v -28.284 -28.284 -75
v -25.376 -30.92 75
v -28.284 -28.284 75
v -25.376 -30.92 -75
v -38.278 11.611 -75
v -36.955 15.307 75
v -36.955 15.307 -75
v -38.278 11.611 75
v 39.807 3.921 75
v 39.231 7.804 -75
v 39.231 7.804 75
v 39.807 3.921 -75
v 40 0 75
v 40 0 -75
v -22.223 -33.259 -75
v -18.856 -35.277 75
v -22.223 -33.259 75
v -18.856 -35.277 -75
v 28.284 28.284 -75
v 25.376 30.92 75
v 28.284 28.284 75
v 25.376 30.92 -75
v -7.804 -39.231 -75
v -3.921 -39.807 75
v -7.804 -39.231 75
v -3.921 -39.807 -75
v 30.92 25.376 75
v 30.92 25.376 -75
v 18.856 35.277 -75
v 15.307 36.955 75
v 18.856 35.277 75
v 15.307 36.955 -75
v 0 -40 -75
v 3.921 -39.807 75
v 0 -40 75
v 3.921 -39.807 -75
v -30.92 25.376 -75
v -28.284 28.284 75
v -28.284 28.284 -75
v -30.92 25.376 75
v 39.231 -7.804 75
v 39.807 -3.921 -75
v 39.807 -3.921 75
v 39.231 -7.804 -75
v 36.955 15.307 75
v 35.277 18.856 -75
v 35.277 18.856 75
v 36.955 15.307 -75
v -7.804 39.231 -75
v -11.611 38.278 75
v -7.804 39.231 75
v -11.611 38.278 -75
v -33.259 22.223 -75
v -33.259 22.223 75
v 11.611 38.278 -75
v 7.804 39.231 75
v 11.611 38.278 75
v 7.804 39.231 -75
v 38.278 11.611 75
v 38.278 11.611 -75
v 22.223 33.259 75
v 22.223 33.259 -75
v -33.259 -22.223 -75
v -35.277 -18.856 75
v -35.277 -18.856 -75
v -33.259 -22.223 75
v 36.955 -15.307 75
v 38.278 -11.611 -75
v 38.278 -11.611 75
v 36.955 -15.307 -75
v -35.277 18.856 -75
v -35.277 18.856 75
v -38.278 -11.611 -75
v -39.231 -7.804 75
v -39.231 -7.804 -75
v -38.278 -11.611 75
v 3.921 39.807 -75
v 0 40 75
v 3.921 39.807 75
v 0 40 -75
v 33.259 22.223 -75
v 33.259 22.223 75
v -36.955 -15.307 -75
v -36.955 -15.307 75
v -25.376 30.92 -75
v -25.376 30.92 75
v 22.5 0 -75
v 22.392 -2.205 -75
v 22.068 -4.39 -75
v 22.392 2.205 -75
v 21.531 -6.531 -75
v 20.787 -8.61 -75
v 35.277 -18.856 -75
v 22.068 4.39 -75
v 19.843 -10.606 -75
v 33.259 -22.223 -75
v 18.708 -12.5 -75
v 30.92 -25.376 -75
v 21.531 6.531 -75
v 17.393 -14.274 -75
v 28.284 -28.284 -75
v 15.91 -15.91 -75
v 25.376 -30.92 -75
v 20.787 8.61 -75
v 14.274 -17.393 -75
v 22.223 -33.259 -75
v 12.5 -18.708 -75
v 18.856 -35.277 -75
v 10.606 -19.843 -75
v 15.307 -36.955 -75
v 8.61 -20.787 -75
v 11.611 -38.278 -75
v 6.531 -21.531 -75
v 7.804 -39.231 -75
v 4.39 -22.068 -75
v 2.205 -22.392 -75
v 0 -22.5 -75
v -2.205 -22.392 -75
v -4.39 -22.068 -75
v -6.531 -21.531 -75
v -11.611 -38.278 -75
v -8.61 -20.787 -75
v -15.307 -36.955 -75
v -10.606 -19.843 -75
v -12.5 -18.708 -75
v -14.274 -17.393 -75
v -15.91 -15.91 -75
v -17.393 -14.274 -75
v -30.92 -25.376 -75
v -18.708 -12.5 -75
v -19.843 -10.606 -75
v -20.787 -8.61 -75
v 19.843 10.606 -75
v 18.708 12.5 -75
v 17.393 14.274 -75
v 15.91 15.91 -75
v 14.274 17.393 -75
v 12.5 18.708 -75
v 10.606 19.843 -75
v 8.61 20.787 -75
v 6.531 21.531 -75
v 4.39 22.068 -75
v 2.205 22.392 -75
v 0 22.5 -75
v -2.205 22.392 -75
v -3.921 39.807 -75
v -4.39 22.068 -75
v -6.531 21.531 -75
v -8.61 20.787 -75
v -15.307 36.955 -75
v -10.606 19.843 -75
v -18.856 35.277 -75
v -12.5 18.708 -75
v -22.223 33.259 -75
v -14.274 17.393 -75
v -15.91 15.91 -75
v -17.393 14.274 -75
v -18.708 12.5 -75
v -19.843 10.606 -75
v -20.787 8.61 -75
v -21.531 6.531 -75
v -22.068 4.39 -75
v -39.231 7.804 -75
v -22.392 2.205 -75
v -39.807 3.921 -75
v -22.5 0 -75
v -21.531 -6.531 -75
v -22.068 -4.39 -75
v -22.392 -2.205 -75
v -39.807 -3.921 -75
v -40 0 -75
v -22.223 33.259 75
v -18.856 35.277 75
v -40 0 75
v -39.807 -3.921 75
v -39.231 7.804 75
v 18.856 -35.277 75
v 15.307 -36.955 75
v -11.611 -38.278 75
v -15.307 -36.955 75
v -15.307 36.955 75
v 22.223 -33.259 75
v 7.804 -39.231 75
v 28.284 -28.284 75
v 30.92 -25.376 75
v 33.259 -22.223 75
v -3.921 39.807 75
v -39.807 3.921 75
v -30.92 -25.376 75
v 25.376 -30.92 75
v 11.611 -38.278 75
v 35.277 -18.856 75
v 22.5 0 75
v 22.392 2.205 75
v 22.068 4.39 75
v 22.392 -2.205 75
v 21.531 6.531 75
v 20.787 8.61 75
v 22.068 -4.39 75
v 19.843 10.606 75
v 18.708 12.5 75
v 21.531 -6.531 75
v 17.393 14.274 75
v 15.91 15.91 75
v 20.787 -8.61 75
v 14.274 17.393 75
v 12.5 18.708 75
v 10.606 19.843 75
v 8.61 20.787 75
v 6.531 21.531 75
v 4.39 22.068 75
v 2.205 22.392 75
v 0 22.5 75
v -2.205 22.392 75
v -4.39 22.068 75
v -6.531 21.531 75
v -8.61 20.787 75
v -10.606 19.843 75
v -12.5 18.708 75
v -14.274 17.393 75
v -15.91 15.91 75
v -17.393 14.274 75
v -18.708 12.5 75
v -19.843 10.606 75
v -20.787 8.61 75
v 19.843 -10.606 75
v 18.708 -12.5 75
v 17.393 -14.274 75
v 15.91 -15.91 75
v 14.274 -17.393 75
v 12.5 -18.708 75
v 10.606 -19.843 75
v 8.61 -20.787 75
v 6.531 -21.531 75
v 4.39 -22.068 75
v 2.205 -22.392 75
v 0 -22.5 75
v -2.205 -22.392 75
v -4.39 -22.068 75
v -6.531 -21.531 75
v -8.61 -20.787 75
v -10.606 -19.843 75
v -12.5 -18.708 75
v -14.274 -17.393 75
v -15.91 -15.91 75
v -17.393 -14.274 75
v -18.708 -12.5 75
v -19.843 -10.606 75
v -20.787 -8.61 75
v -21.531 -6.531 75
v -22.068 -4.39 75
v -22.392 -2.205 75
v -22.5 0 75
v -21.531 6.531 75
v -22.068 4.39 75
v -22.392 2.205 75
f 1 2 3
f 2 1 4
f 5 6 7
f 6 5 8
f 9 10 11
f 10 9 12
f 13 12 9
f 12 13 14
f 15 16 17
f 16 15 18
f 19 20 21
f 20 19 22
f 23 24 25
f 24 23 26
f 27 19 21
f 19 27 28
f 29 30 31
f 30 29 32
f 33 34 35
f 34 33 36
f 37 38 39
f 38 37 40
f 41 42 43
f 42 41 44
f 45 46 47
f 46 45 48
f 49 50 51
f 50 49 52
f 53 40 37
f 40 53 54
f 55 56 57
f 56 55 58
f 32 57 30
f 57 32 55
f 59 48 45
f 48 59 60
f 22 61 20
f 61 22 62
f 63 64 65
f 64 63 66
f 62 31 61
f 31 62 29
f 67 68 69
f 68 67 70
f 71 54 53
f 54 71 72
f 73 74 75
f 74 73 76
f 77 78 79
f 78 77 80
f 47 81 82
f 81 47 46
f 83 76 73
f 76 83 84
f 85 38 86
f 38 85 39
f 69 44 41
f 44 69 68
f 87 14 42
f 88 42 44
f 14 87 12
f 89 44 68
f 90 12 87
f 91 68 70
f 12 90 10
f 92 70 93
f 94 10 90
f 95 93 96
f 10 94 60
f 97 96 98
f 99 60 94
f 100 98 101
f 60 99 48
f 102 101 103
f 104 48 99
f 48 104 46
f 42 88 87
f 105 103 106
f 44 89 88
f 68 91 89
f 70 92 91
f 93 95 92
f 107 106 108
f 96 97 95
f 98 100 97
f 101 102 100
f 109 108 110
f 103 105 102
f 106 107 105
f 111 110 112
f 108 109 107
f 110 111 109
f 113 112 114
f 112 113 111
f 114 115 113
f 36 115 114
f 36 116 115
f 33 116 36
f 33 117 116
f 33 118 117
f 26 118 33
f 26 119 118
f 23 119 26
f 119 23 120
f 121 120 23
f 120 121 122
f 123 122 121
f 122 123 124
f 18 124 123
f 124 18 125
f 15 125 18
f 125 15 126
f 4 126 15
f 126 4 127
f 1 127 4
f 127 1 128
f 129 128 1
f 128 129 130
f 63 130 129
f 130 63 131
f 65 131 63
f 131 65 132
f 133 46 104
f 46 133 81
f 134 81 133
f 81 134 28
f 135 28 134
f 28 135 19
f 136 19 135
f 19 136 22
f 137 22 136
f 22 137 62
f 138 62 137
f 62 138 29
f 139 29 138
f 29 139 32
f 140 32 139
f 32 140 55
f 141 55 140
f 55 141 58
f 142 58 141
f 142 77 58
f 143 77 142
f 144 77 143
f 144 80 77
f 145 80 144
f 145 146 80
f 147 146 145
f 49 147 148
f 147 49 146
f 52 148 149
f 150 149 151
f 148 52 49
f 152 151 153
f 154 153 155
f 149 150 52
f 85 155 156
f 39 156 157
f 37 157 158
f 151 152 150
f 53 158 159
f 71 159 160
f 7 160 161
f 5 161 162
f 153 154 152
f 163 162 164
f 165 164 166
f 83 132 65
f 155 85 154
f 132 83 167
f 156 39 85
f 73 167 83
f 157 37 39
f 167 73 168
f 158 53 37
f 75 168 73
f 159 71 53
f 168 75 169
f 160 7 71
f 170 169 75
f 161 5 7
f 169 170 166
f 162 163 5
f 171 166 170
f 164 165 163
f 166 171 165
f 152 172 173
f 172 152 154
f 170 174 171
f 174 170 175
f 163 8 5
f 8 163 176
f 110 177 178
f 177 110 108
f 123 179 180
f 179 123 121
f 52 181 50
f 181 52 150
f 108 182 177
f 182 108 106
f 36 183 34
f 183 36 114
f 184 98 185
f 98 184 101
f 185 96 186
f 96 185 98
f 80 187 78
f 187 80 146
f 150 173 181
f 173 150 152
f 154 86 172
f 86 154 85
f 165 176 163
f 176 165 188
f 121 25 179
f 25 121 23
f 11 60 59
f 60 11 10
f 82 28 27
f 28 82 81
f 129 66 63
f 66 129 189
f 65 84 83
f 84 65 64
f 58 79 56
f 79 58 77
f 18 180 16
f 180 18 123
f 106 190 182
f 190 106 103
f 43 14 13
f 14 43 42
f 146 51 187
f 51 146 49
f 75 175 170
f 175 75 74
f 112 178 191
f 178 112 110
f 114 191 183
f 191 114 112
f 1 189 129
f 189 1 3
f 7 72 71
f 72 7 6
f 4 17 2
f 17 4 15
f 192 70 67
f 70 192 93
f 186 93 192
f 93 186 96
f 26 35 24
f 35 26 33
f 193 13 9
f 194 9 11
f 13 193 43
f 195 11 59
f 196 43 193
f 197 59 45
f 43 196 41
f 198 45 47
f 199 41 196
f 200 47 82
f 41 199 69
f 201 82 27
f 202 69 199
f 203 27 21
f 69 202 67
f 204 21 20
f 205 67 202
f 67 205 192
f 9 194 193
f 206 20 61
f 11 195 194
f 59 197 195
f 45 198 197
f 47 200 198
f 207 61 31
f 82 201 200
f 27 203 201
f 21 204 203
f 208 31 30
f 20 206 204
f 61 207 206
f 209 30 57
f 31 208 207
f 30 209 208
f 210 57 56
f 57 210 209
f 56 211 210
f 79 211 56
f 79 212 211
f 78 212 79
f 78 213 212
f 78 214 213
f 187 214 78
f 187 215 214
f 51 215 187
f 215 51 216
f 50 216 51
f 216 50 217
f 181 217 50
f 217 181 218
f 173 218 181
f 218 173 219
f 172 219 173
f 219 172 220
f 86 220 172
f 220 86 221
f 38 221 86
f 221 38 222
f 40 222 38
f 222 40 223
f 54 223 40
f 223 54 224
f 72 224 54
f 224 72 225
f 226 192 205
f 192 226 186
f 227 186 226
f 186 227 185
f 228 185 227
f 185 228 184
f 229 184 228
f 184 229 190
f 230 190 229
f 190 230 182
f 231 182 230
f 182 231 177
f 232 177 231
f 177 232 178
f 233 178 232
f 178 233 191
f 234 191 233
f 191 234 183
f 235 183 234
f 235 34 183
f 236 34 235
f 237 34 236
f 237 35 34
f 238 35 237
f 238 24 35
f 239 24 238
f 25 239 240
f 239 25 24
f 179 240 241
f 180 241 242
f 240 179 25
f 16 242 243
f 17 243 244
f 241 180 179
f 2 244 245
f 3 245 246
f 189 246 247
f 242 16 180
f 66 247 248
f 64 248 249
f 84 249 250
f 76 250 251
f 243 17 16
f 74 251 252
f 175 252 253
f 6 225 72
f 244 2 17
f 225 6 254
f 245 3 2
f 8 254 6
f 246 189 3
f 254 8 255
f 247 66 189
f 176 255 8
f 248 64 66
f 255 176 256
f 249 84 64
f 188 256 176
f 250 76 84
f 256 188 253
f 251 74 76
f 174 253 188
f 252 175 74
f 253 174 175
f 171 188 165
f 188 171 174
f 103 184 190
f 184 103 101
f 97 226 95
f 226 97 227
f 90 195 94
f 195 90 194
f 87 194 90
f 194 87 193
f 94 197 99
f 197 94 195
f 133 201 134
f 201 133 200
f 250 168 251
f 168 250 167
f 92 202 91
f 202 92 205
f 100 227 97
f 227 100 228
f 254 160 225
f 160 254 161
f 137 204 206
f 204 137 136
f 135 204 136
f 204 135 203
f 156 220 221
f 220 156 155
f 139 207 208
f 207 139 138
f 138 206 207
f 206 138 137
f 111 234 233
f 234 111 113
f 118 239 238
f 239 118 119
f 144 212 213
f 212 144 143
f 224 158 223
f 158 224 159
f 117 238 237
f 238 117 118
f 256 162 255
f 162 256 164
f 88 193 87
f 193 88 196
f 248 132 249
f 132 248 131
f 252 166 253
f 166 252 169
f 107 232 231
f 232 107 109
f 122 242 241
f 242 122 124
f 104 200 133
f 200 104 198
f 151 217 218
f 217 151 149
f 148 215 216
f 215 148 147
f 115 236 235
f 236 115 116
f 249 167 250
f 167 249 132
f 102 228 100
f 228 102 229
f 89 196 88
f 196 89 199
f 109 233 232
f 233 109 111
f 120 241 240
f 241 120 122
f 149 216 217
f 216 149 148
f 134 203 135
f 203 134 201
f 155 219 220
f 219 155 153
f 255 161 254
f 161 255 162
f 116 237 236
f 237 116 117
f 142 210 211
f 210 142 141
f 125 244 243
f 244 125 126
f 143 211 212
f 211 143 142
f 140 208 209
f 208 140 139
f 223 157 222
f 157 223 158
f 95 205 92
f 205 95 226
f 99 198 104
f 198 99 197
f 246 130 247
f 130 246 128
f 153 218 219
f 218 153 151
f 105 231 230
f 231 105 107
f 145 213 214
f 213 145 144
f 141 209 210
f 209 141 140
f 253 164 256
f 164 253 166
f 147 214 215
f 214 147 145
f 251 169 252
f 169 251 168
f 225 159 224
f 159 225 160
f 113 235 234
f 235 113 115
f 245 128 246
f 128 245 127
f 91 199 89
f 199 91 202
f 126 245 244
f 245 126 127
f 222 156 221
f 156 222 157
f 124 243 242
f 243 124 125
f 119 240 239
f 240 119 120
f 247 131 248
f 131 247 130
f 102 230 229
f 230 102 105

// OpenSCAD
// bluetooth speaker
$fn = 64;  
walls(35);
module walls(thickness=35) {
difference() {
    cylinder(d = 80, h = 150, center = true);
    color("red")
    cylinder(d = 80-thickness, h = 160, center = true);
    }
}
